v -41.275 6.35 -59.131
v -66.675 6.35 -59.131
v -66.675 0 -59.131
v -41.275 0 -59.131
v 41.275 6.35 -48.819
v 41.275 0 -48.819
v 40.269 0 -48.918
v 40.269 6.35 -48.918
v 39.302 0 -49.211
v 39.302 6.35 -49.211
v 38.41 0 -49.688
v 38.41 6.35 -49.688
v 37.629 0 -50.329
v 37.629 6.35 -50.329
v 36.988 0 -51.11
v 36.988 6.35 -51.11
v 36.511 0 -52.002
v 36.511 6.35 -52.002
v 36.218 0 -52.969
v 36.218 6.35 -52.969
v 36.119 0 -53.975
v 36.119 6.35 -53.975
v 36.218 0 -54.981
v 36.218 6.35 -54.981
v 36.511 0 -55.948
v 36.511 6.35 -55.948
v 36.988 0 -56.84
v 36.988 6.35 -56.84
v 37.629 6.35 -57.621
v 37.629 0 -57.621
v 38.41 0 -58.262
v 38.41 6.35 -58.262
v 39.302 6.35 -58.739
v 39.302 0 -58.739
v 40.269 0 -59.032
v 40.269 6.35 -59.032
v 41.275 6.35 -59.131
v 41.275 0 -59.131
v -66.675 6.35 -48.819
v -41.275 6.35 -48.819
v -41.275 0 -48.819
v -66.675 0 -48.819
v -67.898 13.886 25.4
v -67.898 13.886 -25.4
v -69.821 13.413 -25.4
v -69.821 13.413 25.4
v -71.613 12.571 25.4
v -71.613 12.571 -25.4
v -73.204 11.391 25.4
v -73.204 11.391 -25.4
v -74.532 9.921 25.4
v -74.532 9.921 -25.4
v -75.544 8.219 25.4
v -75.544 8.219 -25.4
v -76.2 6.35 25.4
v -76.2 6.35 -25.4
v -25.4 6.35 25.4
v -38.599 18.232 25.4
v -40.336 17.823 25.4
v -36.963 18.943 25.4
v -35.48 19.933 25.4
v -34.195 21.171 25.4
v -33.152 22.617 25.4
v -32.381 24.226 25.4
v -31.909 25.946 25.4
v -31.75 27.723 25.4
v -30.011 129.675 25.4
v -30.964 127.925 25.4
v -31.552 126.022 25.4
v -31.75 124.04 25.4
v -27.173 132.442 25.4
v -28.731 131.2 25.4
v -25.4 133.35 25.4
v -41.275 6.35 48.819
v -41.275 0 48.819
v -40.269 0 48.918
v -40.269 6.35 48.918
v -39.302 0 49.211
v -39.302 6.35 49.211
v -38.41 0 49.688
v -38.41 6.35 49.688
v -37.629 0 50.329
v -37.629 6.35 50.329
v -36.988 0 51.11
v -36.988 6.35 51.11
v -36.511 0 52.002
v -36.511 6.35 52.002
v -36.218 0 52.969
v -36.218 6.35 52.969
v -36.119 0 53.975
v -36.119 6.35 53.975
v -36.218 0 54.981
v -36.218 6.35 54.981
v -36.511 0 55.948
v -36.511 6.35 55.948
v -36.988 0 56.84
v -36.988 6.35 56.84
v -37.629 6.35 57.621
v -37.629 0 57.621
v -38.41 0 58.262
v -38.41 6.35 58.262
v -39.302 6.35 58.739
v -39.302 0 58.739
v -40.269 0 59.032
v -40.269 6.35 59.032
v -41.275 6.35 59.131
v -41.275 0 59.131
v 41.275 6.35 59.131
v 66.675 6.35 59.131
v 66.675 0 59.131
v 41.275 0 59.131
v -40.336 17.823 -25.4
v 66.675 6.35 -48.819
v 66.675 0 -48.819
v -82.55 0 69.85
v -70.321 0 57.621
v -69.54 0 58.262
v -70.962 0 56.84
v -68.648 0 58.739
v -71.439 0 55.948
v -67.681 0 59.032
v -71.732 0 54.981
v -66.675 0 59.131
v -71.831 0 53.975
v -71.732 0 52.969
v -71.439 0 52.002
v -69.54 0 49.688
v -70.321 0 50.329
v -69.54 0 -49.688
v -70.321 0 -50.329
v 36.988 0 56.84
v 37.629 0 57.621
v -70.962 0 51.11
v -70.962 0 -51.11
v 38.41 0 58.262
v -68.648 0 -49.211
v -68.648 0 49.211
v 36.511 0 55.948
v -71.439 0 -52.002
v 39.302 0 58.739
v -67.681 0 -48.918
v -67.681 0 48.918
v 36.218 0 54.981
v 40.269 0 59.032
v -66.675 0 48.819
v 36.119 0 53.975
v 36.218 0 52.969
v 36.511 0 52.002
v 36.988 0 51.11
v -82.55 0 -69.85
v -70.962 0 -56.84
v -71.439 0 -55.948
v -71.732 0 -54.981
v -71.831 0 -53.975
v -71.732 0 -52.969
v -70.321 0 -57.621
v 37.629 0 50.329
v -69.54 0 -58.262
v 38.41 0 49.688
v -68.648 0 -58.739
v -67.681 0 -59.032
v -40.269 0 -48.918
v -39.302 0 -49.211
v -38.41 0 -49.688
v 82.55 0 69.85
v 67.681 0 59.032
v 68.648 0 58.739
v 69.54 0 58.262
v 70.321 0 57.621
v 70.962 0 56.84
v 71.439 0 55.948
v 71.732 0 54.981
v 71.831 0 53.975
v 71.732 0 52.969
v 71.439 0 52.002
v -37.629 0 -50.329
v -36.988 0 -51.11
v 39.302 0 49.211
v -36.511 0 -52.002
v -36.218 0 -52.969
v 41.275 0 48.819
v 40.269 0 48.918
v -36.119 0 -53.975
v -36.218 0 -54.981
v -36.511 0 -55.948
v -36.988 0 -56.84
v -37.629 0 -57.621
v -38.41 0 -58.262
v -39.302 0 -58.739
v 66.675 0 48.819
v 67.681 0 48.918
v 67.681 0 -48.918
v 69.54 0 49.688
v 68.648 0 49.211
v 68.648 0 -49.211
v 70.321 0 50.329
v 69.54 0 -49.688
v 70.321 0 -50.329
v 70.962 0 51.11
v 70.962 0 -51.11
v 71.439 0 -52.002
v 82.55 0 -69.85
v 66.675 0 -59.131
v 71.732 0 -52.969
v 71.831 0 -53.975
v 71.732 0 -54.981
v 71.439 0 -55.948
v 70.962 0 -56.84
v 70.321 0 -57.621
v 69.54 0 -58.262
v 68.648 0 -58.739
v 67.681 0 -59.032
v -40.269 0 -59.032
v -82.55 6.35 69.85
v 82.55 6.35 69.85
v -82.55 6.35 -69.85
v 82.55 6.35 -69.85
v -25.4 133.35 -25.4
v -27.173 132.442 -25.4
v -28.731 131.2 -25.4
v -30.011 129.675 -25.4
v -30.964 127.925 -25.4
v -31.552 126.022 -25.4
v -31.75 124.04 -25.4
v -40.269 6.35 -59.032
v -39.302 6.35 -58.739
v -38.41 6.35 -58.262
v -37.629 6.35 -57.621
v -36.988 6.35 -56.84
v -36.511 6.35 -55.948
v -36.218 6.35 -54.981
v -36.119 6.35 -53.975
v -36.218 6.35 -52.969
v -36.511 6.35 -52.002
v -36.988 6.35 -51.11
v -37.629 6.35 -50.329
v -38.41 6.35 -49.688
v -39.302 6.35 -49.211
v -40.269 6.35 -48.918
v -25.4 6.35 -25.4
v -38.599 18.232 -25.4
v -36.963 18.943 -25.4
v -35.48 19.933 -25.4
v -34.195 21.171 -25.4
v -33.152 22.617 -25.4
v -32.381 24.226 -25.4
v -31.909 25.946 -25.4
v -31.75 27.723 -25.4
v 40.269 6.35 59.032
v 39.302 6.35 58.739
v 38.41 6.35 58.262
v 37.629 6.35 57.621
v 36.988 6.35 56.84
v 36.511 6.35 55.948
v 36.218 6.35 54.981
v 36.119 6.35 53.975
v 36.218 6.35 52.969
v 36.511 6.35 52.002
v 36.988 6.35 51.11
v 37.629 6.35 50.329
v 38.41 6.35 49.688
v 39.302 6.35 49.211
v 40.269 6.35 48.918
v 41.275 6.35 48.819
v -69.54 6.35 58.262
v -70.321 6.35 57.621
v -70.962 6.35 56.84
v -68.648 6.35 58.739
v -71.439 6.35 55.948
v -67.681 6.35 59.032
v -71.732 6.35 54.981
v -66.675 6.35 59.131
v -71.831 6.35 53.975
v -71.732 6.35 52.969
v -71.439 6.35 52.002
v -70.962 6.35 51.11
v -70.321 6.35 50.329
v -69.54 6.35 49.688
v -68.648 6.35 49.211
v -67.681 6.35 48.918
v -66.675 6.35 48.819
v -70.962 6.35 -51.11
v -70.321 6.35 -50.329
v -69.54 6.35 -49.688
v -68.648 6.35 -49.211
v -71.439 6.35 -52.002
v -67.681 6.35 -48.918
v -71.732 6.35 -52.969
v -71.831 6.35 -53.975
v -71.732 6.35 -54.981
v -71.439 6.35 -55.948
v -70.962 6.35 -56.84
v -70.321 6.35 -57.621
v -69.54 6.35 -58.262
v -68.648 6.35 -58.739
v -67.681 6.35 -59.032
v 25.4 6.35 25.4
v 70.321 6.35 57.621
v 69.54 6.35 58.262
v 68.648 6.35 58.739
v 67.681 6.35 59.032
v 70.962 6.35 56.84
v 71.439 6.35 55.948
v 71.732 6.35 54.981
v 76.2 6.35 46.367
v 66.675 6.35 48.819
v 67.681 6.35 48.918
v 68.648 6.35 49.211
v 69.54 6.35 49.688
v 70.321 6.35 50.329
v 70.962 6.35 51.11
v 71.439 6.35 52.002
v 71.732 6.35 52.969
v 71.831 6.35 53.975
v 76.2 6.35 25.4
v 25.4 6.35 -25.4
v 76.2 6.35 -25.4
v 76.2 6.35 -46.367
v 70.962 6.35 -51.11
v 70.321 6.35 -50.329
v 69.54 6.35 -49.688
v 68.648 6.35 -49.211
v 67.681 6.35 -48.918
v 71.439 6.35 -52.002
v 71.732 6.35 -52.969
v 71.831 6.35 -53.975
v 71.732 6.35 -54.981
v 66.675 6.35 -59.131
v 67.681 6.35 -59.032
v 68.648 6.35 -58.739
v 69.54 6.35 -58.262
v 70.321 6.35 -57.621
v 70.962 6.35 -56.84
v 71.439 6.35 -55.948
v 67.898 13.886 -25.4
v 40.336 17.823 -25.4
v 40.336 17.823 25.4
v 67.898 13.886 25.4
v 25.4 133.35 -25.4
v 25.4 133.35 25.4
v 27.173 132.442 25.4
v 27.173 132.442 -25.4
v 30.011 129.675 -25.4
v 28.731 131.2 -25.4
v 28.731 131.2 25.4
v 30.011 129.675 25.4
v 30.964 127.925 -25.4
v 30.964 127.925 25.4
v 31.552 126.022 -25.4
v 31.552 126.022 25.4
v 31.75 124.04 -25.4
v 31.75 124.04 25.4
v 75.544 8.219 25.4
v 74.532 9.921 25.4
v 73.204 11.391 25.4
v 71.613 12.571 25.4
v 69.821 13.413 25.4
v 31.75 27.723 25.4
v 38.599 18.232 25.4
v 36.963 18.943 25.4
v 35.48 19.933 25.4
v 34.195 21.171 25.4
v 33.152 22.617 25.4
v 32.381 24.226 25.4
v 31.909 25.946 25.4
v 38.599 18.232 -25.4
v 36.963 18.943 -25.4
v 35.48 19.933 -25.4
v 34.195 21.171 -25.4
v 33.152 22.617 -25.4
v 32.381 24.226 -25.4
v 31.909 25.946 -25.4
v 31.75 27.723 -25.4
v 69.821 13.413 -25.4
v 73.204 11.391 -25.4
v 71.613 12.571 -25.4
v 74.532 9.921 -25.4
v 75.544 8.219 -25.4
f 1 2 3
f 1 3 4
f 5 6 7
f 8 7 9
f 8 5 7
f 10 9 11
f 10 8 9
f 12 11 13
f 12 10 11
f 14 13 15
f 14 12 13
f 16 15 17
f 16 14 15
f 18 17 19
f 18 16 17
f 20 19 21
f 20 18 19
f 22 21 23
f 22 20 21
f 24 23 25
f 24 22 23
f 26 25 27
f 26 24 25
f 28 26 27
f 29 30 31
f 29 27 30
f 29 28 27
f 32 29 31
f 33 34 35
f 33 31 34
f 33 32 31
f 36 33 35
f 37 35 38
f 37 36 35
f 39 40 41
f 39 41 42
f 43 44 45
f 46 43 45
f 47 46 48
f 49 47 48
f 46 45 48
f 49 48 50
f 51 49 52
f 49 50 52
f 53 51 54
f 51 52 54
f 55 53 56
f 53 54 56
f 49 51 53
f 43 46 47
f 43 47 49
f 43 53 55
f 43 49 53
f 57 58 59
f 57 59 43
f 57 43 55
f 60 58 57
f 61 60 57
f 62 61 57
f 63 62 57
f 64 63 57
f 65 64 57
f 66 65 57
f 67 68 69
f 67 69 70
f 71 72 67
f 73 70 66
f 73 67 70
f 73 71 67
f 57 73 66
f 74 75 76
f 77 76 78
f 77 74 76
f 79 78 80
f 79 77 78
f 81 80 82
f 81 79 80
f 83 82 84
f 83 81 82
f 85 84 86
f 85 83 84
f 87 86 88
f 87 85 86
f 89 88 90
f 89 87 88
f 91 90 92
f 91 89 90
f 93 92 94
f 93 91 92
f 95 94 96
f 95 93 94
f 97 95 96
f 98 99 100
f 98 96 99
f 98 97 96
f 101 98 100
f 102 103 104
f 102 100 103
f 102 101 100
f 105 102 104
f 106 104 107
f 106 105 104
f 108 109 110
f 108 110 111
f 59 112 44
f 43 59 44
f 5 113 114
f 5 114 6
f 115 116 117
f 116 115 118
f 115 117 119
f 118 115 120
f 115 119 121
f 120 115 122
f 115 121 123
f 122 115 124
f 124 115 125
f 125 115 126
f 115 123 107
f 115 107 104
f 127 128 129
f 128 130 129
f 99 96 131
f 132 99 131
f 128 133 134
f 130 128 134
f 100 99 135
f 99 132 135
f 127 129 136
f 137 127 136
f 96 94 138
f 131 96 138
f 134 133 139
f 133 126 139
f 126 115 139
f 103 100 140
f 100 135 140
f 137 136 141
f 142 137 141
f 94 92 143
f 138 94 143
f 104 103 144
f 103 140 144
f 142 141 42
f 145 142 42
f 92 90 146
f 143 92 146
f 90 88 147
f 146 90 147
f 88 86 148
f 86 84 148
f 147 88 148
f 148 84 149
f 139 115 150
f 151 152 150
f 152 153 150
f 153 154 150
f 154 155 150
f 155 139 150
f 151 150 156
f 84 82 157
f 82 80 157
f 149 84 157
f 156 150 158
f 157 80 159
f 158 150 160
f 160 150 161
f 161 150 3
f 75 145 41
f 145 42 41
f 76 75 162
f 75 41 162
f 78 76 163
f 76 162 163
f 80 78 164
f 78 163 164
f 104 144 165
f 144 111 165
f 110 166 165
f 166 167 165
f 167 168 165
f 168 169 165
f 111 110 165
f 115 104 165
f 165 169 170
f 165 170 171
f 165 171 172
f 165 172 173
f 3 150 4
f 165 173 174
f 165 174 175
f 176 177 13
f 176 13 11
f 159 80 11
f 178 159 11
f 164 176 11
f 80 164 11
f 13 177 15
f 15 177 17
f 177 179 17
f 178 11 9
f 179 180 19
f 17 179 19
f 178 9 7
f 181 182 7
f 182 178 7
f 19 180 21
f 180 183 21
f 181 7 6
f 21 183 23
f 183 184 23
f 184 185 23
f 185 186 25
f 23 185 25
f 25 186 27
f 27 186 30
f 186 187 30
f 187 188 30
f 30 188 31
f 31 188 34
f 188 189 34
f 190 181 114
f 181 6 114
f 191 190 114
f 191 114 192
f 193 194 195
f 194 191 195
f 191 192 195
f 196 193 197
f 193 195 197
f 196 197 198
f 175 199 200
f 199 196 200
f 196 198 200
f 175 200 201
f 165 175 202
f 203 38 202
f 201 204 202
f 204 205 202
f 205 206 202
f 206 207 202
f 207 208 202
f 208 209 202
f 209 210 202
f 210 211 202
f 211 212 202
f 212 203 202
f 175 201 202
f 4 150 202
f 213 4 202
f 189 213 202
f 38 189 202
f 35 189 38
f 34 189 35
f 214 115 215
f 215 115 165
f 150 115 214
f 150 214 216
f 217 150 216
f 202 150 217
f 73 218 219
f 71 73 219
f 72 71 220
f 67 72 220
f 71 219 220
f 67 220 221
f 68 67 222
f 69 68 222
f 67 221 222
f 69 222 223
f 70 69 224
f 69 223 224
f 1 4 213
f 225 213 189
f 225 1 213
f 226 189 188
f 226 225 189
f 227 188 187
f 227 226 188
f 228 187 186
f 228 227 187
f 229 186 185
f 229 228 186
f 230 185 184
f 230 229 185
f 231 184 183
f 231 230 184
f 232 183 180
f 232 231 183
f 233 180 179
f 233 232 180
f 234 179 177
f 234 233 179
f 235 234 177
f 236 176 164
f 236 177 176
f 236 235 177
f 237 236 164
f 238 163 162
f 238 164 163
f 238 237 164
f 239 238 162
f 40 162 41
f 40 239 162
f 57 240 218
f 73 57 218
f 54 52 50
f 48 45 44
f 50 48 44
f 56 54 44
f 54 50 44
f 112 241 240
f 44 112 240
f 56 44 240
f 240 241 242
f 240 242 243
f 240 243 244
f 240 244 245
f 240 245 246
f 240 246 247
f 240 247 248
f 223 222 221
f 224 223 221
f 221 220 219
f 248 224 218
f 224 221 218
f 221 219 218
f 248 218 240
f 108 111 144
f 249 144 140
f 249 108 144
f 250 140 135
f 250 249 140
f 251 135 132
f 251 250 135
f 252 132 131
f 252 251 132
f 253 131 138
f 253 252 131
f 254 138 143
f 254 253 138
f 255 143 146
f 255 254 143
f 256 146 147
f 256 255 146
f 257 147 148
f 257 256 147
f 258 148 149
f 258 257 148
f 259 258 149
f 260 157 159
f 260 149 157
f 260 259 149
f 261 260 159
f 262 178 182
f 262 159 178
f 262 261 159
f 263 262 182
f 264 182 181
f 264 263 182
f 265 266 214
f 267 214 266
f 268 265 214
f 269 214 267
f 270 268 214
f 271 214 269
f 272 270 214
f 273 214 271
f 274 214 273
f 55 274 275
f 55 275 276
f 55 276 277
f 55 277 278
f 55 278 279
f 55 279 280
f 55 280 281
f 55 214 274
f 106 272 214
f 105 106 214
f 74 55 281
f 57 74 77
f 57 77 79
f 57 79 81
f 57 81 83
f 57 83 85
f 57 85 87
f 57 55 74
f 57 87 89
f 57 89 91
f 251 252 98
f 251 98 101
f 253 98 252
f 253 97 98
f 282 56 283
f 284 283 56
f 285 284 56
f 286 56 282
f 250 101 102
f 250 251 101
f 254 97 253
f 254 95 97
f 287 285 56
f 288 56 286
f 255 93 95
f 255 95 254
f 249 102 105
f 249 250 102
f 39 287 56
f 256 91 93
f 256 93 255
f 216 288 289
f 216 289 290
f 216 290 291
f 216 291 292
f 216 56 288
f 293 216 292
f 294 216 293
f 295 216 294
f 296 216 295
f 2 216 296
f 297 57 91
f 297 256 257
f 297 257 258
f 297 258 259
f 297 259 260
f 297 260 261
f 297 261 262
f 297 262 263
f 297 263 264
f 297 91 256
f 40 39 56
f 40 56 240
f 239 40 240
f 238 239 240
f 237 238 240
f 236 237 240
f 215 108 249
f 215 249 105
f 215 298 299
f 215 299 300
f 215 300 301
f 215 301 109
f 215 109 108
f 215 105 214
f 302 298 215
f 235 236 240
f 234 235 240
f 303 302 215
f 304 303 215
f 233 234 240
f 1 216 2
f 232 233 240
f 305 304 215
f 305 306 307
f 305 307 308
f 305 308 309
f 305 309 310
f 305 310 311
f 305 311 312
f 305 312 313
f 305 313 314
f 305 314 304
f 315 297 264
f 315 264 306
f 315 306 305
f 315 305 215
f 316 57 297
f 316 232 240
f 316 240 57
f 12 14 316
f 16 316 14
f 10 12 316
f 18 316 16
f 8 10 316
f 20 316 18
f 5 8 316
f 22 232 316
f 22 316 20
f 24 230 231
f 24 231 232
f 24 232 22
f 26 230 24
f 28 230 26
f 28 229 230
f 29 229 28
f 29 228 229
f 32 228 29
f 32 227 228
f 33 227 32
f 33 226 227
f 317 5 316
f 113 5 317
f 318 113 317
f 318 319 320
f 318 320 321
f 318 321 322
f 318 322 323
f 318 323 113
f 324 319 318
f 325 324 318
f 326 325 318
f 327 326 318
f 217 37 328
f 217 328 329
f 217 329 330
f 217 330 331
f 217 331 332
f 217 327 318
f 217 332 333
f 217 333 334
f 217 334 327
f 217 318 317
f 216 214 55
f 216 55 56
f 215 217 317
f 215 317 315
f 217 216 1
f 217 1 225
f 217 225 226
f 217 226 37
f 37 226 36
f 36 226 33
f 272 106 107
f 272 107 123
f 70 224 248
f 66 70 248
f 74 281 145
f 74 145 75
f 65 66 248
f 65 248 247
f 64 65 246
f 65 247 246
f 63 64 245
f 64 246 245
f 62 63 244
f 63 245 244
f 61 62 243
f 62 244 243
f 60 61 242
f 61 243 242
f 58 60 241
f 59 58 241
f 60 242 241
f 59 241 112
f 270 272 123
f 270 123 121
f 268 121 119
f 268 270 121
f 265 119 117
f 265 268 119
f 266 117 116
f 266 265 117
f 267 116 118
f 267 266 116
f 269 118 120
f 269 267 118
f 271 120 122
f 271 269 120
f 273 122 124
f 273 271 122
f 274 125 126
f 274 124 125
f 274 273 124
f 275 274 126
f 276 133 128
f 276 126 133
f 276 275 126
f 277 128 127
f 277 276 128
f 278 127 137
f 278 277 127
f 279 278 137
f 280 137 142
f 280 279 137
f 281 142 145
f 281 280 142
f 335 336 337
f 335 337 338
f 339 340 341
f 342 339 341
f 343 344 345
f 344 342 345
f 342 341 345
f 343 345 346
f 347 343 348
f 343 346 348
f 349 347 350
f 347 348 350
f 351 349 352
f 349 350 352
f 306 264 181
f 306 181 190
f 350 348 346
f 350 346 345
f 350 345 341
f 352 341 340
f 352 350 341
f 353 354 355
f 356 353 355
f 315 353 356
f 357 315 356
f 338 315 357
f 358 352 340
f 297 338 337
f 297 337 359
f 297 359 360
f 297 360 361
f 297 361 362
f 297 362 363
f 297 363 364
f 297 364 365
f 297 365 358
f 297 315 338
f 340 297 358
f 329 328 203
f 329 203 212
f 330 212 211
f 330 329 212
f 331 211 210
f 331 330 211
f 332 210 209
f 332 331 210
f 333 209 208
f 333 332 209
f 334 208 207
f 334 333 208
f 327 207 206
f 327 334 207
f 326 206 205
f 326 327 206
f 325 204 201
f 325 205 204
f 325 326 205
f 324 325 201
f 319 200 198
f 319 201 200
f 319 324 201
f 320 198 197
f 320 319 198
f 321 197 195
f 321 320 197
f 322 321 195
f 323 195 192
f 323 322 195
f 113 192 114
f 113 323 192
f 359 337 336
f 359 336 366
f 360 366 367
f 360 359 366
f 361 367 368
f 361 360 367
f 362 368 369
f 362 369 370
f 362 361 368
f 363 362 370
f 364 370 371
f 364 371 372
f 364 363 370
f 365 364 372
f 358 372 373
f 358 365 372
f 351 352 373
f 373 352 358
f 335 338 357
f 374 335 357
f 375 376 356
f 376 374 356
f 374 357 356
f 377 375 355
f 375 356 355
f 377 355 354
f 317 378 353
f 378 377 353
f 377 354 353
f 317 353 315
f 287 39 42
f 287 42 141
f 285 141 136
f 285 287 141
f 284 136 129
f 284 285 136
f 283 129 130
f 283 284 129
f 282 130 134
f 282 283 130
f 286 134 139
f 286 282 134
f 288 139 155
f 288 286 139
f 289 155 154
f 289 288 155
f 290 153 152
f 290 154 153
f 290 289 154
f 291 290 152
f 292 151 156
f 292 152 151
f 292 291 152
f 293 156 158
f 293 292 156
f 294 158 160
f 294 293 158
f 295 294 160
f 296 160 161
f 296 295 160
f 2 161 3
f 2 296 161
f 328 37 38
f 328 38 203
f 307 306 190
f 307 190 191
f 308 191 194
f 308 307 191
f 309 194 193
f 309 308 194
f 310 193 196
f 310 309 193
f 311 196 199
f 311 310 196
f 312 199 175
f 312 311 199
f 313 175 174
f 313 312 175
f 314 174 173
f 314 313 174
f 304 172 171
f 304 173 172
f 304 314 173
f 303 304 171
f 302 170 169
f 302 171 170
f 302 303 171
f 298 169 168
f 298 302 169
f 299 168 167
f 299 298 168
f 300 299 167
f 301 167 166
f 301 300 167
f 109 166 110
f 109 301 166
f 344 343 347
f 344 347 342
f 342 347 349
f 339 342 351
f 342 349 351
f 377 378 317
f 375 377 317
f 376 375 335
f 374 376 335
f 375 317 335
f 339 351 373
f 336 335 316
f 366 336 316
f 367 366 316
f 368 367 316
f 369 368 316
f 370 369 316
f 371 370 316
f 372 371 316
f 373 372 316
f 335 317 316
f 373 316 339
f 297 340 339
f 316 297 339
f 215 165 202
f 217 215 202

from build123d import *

# Parameters (mm, degrees)
SKETCH1_W           = 165.1
SKETCH1_H           = 139.7
BOSS_EXTRUDE1_DEPTH = 6.35
SKETCH2_W           = 50.8
SKETCH2_H           = 50.8
BOSS_EXTRUDE2_DEPTH = 127
CUT_EXTRUDE1_DEPTH  = 184.491927615
FILLET1_R           = 10
MIRROR6_START       = -25.4
MIRROR6_DEPTH       = 50.8
CUT_EXTRUDE2_DEPTH  = 127


with BuildPart() as part:
    # Sketch1 → Boss-Extrude1 (new body)
    with BuildSketch(Plane(origin=(0, 0, 0), x_dir=(1, 0, 0), z_dir=(0, 1, 0))):
        Rectangle(SKETCH1_W, SKETCH1_H)
    extrude(amount=BOSS_EXTRUDE1_DEPTH)

    # Sketch2 → Boss-Extrude2 (add)
    with BuildSketch(Plane(origin=(0, 6.35, 0), x_dir=(1, 0, 0), z_dir=(0, 1, 0))):
        with Locations((50.8, 0)):
            Rectangle(SKETCH2_W, SKETCH2_H)
    extrude(amount=BOSS_EXTRUDE2_DEPTH)

    # Sketch4 → Cut-Extrude1 (cut, through all)
    with BuildSketch(Plane.XY.offset(25.4)):
        Polygon((31.75, 133.35), (31.75, 19.05), (76.2, 12.7), (95.954687833, 12.7), (95.954687833, 161.138699607), (31.75, 161.138699607), align=None)
    extrude(amount=-CUT_EXTRUDE1_DEPTH, mode=Mode.SUBTRACT)

    # Fillet1
    # the kernel refuses this fillet: 10 mm, written as the material it adds along each edge
    with BuildSketch(Plane(origin=(31.75, 19.05, 25.4), x_dir=(0.9899494936611666, -0.14142135623730998, 0), z_dir=(0, 0, -1))) as fillet1_piece_1:
        with BuildLine():
            CenterArc((FILLET1_R * 0.867295401695, -FILLET1_R), FILLET1_R, 90, 81.869897646)
            Line((-FILLET1_R * 0.122654091966, -FILLET1_R * 0.858578643763), (0, 0))
            Line((0, 0), (FILLET1_R * 0.867295401695, 0))
        make_face()
    extrude(amount=50.8)
    # the kernel refuses this fillet: 10 mm, written as the material it takes off along each edge
    with BuildSketch(Plane(origin=(76.2, 12.7, 46.366939289), x_dir=(0, -1, 0), z_dir=(0, 0, -1))) as fillet1_2_piece_1:
        with BuildLine():
            CenterArc((8.71342574, 9.716697935), FILLET1_R, 188.130102354, 68.199121512)
            Line((-1.186069196, 8.302484373), (0, 0))
            Line((0, 0), (6.35, 0))
        make_face()
    extrude(amount=92.733878578, mode=Mode.SUBTRACT)
    with BuildSketch(Plane(origin=(31.75, 133.35, 48.675187969), x_dir=(-1, 0, 0), z_dir=(0, 0, -1))) as fillet1_2_piece_2:
        with BuildLine():
            CenterArc((10, -9.310075188), FILLET1_R, 111.407582704, 68.592417296)
            Line((0, -9.310075188), (0, 0))
            Line((0, 0), (6.35, 0))
        make_face()
    extrude(amount=97.350375938, mode=Mode.SUBTRACT)

    # Mirror6: read off the stored shape, not the designer's step
    # Mirror6 outline → Mirror6 (add)
    with BuildSketch(Plane.XY.offset(MIRROR6_START)):
        with BuildLine():
            Line((-76.2, 6.35), (-25.4, 6.35))
            Line((-25.4, 6.35), (-25.4, 133.35))
            ThreePointArc((-25.4, 133.35), (-30.011355821, 129.674638647), (-31.75, 124.039924812))
            Line((-31.75, 124.039924812), (-31.75, 27.722954017))
            ThreePointArc((-31.75, 27.722954017), (-34.19546045, 21.170936603), (-40.335786438, 17.82345908))
            Line((-40.335786438, 17.82345908), (-67.897515627, 13.886069196))
            ThreePointArc((-67.897515627, 13.886069196), (-73.204342343, 11.391141605), (-76.2, 6.35))
        make_face()
    extrude(amount=MIRROR6_DEPTH)

    # Sketch6 → Cut-Extrude2 (cut)
    with BuildSketch(Plane(origin=(0, 6.35, 0), x_dir=(-1, 0, 0), z_dir=(0, 1, 0))):
        with BuildLine():
            Line((-41.275, 48.8188), (-66.675, 48.8188))
            ThreePointArc((-66.675, 48.8188), (-71.8312, 53.975), (-66.675, 59.1312))
            Line((-66.675, 59.1312), (-41.275, 59.1312))
            ThreePointArc((-41.275, 59.1312), (-36.1188, 53.975), (-41.275, 48.8188))
        make_face()
        with BuildLine():
            Line((-41.275, -59.1312), (-66.675, -59.1312))
            ThreePointArc((-66.675, -59.1312), (-71.8312, -53.975), (-66.675, -48.8188))
            Line((-66.675, -48.8188), (-41.275, -48.8188))
            ThreePointArc((-41.275, -48.8188), (-36.1188, -53.975), (-41.275, -59.1312))
        make_face()
        with BuildLine():
            Line((41.275, 59.1312), (66.675, 59.1312))
            ThreePointArc((66.675, 59.1312), (71.8312, 53.975), (66.675, 48.8188))
            Line((66.675, 48.8188), (41.275, 48.8188))
            ThreePointArc((41.275, 48.8188), (36.1188, 53.975), (41.275, 59.1312))
        make_face()
        with BuildLine():
            Line((41.275, -48.8188), (66.675, -48.8188))
            ThreePointArc((66.675, -48.8188), (71.8312, -53.975), (66.675, -59.1312))
            Line((66.675, -59.1312), (41.275, -59.1312))
            ThreePointArc((41.275, -59.1312), (36.1188, -53.975), (41.275, -48.8188))
        make_face()
    extrude(amount=-CUT_EXTRUDE2_DEPTH, mode=Mode.SUBTRACT)


solid = part.part
